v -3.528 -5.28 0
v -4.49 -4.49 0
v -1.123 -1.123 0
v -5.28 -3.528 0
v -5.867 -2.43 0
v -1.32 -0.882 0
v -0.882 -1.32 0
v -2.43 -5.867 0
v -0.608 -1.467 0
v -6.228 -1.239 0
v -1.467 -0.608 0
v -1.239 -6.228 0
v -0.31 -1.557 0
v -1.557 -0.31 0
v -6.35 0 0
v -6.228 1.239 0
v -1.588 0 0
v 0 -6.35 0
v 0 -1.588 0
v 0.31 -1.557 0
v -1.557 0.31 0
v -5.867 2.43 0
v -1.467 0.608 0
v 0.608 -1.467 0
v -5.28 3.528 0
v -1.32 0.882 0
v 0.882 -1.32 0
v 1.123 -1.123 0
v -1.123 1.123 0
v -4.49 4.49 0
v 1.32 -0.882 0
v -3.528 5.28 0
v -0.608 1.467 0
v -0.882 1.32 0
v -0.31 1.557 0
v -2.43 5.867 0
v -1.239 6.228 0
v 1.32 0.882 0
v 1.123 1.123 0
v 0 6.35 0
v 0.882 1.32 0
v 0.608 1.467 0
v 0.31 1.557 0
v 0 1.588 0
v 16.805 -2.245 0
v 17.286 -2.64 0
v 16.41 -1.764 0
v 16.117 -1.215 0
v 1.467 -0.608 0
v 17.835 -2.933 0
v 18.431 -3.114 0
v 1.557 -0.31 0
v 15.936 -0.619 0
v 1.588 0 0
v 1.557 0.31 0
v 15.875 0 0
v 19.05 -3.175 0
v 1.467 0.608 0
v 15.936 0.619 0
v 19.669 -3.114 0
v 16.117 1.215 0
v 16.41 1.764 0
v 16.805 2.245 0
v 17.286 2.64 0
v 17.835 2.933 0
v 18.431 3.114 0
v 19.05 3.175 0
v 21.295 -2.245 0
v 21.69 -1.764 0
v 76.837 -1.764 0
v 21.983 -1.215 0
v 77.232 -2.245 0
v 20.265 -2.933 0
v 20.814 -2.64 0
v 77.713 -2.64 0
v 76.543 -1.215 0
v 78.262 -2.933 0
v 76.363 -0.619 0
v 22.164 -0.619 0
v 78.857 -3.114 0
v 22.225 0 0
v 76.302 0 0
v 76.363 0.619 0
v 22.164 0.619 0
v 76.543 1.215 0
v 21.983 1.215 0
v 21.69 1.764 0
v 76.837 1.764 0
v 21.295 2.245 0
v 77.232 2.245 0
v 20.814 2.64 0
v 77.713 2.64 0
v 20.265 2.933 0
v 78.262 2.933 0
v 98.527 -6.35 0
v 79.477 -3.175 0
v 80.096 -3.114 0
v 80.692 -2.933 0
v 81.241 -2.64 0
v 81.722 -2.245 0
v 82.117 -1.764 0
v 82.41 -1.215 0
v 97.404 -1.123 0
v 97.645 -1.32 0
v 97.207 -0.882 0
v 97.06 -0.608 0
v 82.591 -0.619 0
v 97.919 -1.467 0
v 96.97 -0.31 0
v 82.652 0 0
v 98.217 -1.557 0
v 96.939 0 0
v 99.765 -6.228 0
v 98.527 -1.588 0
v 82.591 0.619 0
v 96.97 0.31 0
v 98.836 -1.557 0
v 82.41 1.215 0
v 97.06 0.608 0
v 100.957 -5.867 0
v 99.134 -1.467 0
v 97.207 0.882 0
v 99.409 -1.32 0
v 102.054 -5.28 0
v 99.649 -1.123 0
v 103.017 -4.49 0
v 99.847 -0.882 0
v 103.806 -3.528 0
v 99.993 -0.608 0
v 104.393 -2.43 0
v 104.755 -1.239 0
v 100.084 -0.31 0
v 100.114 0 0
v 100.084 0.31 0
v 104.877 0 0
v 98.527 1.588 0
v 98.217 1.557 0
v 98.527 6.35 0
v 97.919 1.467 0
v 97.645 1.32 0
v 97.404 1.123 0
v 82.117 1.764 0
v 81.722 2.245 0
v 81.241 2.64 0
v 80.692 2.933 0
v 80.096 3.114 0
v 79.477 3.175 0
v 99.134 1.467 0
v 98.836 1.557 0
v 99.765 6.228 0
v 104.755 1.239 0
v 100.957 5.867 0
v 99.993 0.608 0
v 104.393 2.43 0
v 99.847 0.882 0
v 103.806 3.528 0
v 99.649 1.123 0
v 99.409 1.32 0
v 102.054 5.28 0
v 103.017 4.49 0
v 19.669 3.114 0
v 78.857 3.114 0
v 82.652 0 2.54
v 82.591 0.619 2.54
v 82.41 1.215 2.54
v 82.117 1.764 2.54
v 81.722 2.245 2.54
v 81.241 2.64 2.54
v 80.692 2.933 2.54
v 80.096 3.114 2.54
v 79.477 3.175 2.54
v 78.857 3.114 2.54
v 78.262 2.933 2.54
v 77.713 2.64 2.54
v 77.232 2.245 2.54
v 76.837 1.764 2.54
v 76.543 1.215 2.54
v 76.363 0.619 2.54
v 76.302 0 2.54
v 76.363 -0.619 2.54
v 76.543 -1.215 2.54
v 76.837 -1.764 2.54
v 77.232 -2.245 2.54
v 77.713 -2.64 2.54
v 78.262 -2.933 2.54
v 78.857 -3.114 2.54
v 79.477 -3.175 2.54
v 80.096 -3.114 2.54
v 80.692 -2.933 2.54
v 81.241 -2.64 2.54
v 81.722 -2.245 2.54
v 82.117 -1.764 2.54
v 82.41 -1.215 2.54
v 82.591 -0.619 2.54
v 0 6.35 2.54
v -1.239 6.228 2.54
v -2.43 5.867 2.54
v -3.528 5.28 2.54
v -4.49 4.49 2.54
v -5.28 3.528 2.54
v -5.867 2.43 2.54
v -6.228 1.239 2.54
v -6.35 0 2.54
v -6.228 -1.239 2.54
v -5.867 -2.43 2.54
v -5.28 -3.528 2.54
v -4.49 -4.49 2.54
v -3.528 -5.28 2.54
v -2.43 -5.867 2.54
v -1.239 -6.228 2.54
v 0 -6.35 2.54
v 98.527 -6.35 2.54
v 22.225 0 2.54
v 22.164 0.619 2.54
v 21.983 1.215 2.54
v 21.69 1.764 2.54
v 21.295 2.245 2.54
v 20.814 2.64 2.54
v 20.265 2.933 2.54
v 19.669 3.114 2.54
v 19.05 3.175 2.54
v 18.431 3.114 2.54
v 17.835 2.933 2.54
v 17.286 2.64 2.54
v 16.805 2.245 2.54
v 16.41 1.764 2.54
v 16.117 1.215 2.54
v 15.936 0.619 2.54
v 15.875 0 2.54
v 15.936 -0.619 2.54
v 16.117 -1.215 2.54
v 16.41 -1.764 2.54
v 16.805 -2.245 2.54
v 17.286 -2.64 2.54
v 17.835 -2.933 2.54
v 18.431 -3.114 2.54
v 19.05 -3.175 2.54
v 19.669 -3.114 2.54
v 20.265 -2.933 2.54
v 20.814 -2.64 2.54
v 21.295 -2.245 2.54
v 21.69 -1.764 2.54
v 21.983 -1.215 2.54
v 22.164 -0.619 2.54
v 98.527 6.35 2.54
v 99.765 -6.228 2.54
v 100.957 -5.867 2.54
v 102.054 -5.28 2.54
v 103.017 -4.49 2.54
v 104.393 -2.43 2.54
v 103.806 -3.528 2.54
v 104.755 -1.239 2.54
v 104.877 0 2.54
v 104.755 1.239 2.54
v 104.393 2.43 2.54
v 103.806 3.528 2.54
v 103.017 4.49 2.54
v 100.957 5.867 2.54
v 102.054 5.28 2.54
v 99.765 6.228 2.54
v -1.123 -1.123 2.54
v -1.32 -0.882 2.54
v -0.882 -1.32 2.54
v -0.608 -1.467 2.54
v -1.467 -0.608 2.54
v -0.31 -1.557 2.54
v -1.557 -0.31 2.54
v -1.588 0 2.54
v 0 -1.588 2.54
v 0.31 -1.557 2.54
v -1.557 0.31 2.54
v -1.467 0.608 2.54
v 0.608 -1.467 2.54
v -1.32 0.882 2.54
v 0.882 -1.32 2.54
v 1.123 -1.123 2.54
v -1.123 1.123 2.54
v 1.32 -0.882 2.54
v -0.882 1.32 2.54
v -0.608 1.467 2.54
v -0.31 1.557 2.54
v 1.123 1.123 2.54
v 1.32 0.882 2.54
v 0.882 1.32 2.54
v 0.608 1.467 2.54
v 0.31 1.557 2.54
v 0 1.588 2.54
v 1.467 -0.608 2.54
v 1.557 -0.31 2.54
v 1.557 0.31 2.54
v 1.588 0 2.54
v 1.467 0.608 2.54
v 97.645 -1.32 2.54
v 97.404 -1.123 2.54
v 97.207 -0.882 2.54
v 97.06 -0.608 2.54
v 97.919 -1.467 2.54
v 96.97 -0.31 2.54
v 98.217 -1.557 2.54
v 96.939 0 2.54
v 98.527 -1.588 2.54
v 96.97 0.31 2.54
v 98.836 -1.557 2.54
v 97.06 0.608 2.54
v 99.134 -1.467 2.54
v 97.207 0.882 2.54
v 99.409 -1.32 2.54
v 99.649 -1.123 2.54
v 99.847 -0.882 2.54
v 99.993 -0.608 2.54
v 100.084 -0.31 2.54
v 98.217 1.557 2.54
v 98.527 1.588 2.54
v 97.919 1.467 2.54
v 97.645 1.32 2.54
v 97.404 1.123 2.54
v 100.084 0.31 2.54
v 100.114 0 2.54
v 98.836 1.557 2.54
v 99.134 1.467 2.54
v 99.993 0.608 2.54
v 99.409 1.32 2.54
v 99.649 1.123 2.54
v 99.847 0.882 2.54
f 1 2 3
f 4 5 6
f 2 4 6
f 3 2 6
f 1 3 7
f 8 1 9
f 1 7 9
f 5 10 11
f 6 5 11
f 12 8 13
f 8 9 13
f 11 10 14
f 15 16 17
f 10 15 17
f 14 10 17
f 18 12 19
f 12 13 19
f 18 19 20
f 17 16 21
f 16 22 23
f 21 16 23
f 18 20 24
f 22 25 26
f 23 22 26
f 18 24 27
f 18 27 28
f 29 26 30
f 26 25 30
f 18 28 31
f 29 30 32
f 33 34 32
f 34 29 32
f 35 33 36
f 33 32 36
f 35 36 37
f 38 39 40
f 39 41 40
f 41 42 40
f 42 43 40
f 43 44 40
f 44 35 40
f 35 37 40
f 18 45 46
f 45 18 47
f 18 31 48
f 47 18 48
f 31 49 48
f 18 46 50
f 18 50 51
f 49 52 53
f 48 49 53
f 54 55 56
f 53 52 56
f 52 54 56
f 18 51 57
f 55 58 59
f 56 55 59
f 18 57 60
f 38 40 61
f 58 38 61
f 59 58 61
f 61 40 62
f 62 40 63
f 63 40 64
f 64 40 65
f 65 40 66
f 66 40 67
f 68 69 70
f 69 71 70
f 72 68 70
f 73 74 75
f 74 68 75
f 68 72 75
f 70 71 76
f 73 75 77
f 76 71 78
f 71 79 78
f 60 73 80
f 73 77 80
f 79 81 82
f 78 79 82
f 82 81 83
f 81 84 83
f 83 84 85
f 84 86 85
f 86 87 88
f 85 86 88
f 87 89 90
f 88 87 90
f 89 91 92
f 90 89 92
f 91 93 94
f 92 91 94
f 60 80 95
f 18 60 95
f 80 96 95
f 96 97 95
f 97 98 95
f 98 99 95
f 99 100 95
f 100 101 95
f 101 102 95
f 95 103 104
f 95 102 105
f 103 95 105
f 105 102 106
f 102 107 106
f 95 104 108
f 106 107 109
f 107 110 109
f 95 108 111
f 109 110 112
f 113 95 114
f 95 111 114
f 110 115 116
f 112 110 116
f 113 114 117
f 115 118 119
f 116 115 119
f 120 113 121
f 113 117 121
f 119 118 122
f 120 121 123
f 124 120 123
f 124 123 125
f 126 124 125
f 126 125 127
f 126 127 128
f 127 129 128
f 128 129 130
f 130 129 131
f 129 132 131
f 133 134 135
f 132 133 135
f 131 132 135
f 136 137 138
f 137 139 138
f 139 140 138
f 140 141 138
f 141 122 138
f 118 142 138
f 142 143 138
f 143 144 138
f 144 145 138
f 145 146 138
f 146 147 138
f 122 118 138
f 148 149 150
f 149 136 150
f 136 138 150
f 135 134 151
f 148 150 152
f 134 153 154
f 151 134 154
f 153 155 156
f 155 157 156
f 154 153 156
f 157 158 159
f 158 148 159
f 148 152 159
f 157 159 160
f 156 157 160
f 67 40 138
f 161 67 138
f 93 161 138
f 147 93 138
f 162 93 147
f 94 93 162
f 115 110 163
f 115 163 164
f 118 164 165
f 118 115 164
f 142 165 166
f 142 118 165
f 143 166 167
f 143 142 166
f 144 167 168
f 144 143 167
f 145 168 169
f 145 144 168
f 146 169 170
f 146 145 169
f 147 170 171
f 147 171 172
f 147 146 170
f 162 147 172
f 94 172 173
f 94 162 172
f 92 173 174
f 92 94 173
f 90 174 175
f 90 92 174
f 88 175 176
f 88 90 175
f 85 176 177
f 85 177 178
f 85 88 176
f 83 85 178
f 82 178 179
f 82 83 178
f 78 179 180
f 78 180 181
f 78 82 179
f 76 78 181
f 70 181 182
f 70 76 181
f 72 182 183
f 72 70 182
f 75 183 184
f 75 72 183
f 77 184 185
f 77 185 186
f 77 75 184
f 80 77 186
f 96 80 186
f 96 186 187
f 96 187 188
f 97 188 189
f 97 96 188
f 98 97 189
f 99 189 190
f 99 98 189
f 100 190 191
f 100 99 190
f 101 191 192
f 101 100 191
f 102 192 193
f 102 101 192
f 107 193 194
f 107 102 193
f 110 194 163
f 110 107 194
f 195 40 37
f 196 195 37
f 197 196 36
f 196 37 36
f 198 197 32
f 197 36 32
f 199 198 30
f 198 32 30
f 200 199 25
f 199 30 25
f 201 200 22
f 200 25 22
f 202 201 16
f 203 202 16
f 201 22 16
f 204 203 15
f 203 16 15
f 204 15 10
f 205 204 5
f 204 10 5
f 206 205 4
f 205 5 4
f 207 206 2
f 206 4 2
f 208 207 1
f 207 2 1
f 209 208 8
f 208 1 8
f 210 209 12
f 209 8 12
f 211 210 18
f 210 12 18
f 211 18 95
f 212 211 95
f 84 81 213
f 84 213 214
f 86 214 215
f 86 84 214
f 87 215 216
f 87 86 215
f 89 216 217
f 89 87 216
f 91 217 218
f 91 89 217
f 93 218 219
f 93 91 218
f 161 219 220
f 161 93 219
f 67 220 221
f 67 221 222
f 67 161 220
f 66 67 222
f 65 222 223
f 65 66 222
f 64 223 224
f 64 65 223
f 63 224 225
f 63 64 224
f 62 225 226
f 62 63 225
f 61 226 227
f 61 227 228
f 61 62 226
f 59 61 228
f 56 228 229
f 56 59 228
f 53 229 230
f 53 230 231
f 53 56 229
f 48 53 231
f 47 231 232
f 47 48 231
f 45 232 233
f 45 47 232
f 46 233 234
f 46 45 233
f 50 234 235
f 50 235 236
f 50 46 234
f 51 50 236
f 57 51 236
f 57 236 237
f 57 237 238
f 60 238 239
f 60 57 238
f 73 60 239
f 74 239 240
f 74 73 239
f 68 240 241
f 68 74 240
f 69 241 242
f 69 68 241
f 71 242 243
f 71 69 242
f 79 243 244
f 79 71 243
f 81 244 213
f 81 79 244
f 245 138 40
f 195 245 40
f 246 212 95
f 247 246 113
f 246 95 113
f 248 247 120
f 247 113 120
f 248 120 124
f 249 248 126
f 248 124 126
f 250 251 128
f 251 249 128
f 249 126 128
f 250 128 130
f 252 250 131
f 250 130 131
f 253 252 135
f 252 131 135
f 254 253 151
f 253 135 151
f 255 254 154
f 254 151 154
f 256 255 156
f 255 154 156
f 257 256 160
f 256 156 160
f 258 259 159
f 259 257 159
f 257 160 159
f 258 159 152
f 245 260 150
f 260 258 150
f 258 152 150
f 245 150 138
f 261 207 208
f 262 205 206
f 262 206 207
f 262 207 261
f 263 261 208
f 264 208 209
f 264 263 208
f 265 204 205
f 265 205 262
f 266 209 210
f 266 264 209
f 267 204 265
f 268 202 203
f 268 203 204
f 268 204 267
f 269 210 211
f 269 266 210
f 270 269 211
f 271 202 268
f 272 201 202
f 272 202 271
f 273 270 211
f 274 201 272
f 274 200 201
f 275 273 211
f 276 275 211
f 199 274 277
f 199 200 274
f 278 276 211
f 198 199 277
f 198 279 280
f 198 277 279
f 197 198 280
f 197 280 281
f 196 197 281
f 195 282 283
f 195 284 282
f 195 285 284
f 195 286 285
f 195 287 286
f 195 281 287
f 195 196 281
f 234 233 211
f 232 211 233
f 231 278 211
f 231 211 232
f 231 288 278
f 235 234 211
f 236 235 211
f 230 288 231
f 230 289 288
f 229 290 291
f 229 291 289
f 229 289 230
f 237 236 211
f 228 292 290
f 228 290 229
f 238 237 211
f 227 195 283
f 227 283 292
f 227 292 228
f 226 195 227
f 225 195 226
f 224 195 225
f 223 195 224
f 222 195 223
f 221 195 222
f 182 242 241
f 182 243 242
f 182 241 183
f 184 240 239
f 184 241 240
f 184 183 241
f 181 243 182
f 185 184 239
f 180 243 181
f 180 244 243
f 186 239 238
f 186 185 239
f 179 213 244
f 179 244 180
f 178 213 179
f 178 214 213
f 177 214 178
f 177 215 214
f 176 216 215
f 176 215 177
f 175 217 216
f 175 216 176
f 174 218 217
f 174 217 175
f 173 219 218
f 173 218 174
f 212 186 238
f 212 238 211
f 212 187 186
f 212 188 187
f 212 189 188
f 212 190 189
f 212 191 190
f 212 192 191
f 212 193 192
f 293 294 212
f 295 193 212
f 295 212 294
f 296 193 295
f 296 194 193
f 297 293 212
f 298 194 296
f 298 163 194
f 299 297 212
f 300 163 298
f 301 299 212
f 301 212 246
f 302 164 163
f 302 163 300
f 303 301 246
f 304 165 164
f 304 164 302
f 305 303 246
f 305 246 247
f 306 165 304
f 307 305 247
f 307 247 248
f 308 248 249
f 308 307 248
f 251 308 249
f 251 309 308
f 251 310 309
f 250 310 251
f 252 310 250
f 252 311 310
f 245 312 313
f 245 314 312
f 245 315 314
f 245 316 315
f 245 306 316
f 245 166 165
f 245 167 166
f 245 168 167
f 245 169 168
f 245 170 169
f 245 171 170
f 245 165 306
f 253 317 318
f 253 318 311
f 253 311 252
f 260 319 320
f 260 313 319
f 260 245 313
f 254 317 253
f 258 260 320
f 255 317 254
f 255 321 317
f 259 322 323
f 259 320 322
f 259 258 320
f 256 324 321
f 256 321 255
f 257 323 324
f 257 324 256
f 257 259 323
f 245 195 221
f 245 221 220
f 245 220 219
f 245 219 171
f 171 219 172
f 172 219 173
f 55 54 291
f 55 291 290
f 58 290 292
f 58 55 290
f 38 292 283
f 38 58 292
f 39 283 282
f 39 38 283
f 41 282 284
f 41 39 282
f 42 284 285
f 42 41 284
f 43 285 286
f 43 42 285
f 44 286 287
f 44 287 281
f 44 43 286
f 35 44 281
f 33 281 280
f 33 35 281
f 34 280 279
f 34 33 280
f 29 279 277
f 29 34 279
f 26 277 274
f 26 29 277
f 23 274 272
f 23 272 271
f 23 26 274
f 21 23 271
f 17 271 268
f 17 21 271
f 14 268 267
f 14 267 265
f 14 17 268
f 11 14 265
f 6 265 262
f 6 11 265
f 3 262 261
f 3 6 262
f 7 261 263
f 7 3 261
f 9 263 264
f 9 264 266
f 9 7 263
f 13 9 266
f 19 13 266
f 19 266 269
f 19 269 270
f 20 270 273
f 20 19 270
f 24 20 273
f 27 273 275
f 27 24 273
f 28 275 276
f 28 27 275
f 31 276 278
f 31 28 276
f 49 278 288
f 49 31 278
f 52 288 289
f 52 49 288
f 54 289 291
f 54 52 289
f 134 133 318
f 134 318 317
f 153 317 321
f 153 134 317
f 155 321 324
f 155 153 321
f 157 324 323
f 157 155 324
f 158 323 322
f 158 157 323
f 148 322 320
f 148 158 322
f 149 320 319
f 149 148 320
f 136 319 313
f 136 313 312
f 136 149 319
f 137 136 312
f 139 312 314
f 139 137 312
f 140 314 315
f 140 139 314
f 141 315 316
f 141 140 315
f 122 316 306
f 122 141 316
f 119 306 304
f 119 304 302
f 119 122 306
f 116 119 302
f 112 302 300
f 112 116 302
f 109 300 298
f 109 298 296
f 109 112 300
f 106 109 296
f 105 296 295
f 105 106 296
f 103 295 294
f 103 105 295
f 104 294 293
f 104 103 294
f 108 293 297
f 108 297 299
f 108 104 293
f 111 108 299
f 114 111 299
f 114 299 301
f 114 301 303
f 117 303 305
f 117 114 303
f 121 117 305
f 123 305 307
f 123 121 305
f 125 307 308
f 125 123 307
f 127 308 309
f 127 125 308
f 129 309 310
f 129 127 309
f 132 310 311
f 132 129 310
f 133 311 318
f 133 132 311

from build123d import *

# Parameters (mm, degrees)
SKETCH1_R           = 6.35
SKETCH1_R_2         = 1.5875
SKETCH1_R_3         = 3.175
BOSS_EXTRUDE1_DEPTH = 2.54


with BuildPart() as part:
    # Sketch1 → Boss-Extrude1 (new body)
    # profile 1 of 3: a face of its own
    with BuildSketch(Plane.XY):
        Circle(SKETCH1_R)
        Circle(SKETCH1_R_2, mode=Mode.SUBTRACT)
    # profile 2 of 3: a face of its own
    with BuildSketch(Plane.XY):
        with BuildLine():
            Line((98.5266, 6.35), (0, 6.35))
            ThreePointArc((0, 6.35), (4.490128061, 4.490128061), (6.35, 0))
            ThreePointArc((6.35, 0), (4.490128061, -4.490128061), (0, -6.35))
            Line((0, -6.35), (98.5266, -6.35))
            ThreePointArc((98.5266, -6.35), (92.1766, 0), (98.5266, 6.35))
        make_face()
        with Locations((19.05, 0)):
            Circle(SKETCH1_R_3, mode=Mode.SUBTRACT)
        with Locations((79.4766, 0)):
            Circle(SKETCH1_R_3, mode=Mode.SUBTRACT)
    # profile 3 of 3: a face of its own
    with BuildSketch(Plane.XY):
        with Locations((98.5266, 0)):
            Circle(SKETCH1_R)
        with Locations((98.5266, 0)):
            Circle(SKETCH1_R_2, mode=Mode.SUBTRACT)
    extrude(amount=BOSS_EXTRUDE1_DEPTH)


solid = part.part
